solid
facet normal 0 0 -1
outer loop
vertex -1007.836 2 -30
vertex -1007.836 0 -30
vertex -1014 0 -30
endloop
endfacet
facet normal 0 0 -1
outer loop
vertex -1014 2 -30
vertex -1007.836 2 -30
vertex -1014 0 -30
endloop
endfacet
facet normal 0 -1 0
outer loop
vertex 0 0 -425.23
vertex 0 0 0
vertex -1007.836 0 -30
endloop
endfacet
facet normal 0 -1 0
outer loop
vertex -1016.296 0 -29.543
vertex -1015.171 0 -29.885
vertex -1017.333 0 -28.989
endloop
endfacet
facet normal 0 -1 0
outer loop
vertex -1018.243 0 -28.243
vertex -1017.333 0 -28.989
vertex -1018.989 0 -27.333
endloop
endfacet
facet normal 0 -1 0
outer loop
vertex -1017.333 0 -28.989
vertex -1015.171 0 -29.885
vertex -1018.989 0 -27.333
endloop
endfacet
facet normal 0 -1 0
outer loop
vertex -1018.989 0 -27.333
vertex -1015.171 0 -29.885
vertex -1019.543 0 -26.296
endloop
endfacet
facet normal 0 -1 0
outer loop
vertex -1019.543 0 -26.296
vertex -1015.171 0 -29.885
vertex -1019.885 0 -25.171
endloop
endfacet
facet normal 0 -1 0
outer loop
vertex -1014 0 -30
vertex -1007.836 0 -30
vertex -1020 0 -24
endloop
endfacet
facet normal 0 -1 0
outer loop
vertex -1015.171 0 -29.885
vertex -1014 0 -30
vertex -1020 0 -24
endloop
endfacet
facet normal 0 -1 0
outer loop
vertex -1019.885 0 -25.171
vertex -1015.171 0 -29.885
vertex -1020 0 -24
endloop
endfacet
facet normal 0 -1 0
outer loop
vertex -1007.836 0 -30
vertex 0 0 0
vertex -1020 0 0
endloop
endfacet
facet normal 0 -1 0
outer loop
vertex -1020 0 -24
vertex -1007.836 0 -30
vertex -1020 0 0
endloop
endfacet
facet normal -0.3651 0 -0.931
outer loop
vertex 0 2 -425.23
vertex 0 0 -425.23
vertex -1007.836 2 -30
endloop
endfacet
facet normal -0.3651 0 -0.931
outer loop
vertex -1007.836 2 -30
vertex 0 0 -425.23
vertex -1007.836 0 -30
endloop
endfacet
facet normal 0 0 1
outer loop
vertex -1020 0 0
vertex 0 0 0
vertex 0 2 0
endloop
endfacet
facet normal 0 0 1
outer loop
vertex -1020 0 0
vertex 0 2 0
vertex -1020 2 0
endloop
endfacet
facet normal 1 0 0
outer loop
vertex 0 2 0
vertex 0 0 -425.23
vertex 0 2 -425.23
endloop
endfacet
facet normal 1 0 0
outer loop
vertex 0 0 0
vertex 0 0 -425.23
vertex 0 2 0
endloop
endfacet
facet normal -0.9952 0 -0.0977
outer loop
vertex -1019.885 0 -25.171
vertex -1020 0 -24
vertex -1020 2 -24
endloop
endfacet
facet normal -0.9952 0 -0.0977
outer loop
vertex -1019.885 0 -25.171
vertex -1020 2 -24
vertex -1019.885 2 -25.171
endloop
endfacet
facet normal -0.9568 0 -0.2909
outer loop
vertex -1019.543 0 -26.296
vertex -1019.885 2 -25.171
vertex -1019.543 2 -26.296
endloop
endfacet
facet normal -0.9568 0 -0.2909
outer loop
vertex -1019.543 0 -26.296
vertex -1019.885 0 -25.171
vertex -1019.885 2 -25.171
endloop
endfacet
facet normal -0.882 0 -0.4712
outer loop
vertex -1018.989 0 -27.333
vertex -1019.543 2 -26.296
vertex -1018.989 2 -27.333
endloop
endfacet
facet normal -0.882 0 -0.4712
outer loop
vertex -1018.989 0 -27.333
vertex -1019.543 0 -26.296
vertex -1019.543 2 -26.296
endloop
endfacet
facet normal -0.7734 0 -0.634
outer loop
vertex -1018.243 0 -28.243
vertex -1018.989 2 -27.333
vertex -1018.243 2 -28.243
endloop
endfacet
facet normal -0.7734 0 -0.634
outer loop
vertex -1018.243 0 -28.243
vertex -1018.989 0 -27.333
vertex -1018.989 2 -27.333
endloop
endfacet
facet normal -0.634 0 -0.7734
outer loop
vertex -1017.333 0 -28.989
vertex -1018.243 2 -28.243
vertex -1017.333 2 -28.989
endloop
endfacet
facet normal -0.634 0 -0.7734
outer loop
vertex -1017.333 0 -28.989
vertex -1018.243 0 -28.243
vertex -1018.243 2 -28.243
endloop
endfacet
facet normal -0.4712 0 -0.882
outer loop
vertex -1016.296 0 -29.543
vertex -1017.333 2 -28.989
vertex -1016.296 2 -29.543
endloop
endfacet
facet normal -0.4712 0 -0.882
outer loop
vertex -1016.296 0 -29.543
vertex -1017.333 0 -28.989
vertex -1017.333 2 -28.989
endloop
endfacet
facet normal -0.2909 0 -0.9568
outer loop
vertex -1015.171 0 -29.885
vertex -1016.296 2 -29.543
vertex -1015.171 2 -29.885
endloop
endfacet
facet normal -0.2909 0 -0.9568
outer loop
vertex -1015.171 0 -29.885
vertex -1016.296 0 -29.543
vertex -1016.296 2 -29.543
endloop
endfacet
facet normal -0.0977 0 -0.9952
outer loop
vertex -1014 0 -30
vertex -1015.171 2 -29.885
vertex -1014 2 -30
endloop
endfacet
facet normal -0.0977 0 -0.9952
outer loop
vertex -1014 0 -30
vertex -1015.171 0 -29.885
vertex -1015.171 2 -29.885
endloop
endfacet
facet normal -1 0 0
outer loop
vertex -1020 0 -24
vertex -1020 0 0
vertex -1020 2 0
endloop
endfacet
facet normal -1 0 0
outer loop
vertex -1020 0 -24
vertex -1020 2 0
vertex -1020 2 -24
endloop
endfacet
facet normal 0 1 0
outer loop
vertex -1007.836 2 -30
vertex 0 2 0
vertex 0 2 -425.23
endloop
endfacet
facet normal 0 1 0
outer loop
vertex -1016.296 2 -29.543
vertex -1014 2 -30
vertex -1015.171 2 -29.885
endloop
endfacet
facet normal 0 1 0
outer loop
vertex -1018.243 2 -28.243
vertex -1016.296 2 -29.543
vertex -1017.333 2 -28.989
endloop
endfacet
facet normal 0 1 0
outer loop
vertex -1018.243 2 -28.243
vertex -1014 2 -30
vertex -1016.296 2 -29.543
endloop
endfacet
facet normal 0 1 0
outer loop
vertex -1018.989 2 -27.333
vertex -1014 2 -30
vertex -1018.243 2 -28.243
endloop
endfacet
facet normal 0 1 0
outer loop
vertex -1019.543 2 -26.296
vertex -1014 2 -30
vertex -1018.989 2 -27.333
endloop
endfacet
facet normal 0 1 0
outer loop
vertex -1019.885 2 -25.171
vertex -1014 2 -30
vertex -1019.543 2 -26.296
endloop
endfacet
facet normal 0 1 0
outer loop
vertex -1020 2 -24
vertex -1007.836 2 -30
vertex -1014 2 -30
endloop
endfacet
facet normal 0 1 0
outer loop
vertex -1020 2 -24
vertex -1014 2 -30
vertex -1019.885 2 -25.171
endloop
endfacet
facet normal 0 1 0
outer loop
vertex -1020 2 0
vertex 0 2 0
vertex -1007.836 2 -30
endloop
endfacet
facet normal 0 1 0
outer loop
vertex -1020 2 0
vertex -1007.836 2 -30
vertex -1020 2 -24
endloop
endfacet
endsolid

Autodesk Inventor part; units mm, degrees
ref_plane "YZ Plane" through (0, 0, 0) normal (1, 0, 0) x (0, 1, 0)
ref_plane "XZ Plane" through (0, 0, 0) normal (0, 1, 0) x (-1, 0, 0)
ref_plane "XY Plane" through (0, 0, 0) normal (0, 0, 1) x (1, 0, 0)
sketch "Sketch1" plane through (0, 0, 0) normal (0, 1, 0) x (-1, 0, 0)
  line L0 (0, 0) -> (1020, 0)
  line L1 (0, -425.23) -> (0, 0)
  line L2 (1020, 0) -> (1020, -425.23)
  line L3 (1020, -425.23) -> (0, -425.23)
  dimension "d0" = 425.23
  dimension "d1" = 1020
extrude "Plate1" add sketch "Sketch1" along normal blind 2
sketch "Sketch2" plane through (0, 0, 0) normal (0, -1, 0) x (1, 0, 0)
  line L0 (0, -425.2298) -> (-1007.836, -30) projected
  line L1 (-996, -30) -> (-1014, -30) projected
  arc A0 (-1020, -24) -> (-1014, -30) centre (-1014, -24) ccw projected
  line L2 (0, -425.23) -> (-1020, -425.23) projected
  line L3 (0, 0) -> (0, -425.23) projected
  line L4 (-1020, 0) -> (0, 0) projected
  line L5 (-1020, -425.23) -> (-1020, 0) projected
extrude "Extrusion1" cut sketch "Sketch2" against normal through all contours L2 L5 A0 L1 L0
equation "\"d2\" = Thickness"
equation "\"BendRadius\" = Thickness"
equation "\"BendReliefWidth\" = Thickness"
equation "\"BendReliefDepth\" = 0.5 * Thickness"
equation "\"CornerReliefSize\" = 4 * Thickness"
equation "\"MinimumRemnant\" = 2 * Thickness"
equation "\"TransitionRadius\" = BendRadius"
equation "\"JacobiRadiusSize\" = BendRadius"
equation "\"GapSize\" = Thickness"
equation "\"Thickness\" = 2"
properties part number "taringle"
